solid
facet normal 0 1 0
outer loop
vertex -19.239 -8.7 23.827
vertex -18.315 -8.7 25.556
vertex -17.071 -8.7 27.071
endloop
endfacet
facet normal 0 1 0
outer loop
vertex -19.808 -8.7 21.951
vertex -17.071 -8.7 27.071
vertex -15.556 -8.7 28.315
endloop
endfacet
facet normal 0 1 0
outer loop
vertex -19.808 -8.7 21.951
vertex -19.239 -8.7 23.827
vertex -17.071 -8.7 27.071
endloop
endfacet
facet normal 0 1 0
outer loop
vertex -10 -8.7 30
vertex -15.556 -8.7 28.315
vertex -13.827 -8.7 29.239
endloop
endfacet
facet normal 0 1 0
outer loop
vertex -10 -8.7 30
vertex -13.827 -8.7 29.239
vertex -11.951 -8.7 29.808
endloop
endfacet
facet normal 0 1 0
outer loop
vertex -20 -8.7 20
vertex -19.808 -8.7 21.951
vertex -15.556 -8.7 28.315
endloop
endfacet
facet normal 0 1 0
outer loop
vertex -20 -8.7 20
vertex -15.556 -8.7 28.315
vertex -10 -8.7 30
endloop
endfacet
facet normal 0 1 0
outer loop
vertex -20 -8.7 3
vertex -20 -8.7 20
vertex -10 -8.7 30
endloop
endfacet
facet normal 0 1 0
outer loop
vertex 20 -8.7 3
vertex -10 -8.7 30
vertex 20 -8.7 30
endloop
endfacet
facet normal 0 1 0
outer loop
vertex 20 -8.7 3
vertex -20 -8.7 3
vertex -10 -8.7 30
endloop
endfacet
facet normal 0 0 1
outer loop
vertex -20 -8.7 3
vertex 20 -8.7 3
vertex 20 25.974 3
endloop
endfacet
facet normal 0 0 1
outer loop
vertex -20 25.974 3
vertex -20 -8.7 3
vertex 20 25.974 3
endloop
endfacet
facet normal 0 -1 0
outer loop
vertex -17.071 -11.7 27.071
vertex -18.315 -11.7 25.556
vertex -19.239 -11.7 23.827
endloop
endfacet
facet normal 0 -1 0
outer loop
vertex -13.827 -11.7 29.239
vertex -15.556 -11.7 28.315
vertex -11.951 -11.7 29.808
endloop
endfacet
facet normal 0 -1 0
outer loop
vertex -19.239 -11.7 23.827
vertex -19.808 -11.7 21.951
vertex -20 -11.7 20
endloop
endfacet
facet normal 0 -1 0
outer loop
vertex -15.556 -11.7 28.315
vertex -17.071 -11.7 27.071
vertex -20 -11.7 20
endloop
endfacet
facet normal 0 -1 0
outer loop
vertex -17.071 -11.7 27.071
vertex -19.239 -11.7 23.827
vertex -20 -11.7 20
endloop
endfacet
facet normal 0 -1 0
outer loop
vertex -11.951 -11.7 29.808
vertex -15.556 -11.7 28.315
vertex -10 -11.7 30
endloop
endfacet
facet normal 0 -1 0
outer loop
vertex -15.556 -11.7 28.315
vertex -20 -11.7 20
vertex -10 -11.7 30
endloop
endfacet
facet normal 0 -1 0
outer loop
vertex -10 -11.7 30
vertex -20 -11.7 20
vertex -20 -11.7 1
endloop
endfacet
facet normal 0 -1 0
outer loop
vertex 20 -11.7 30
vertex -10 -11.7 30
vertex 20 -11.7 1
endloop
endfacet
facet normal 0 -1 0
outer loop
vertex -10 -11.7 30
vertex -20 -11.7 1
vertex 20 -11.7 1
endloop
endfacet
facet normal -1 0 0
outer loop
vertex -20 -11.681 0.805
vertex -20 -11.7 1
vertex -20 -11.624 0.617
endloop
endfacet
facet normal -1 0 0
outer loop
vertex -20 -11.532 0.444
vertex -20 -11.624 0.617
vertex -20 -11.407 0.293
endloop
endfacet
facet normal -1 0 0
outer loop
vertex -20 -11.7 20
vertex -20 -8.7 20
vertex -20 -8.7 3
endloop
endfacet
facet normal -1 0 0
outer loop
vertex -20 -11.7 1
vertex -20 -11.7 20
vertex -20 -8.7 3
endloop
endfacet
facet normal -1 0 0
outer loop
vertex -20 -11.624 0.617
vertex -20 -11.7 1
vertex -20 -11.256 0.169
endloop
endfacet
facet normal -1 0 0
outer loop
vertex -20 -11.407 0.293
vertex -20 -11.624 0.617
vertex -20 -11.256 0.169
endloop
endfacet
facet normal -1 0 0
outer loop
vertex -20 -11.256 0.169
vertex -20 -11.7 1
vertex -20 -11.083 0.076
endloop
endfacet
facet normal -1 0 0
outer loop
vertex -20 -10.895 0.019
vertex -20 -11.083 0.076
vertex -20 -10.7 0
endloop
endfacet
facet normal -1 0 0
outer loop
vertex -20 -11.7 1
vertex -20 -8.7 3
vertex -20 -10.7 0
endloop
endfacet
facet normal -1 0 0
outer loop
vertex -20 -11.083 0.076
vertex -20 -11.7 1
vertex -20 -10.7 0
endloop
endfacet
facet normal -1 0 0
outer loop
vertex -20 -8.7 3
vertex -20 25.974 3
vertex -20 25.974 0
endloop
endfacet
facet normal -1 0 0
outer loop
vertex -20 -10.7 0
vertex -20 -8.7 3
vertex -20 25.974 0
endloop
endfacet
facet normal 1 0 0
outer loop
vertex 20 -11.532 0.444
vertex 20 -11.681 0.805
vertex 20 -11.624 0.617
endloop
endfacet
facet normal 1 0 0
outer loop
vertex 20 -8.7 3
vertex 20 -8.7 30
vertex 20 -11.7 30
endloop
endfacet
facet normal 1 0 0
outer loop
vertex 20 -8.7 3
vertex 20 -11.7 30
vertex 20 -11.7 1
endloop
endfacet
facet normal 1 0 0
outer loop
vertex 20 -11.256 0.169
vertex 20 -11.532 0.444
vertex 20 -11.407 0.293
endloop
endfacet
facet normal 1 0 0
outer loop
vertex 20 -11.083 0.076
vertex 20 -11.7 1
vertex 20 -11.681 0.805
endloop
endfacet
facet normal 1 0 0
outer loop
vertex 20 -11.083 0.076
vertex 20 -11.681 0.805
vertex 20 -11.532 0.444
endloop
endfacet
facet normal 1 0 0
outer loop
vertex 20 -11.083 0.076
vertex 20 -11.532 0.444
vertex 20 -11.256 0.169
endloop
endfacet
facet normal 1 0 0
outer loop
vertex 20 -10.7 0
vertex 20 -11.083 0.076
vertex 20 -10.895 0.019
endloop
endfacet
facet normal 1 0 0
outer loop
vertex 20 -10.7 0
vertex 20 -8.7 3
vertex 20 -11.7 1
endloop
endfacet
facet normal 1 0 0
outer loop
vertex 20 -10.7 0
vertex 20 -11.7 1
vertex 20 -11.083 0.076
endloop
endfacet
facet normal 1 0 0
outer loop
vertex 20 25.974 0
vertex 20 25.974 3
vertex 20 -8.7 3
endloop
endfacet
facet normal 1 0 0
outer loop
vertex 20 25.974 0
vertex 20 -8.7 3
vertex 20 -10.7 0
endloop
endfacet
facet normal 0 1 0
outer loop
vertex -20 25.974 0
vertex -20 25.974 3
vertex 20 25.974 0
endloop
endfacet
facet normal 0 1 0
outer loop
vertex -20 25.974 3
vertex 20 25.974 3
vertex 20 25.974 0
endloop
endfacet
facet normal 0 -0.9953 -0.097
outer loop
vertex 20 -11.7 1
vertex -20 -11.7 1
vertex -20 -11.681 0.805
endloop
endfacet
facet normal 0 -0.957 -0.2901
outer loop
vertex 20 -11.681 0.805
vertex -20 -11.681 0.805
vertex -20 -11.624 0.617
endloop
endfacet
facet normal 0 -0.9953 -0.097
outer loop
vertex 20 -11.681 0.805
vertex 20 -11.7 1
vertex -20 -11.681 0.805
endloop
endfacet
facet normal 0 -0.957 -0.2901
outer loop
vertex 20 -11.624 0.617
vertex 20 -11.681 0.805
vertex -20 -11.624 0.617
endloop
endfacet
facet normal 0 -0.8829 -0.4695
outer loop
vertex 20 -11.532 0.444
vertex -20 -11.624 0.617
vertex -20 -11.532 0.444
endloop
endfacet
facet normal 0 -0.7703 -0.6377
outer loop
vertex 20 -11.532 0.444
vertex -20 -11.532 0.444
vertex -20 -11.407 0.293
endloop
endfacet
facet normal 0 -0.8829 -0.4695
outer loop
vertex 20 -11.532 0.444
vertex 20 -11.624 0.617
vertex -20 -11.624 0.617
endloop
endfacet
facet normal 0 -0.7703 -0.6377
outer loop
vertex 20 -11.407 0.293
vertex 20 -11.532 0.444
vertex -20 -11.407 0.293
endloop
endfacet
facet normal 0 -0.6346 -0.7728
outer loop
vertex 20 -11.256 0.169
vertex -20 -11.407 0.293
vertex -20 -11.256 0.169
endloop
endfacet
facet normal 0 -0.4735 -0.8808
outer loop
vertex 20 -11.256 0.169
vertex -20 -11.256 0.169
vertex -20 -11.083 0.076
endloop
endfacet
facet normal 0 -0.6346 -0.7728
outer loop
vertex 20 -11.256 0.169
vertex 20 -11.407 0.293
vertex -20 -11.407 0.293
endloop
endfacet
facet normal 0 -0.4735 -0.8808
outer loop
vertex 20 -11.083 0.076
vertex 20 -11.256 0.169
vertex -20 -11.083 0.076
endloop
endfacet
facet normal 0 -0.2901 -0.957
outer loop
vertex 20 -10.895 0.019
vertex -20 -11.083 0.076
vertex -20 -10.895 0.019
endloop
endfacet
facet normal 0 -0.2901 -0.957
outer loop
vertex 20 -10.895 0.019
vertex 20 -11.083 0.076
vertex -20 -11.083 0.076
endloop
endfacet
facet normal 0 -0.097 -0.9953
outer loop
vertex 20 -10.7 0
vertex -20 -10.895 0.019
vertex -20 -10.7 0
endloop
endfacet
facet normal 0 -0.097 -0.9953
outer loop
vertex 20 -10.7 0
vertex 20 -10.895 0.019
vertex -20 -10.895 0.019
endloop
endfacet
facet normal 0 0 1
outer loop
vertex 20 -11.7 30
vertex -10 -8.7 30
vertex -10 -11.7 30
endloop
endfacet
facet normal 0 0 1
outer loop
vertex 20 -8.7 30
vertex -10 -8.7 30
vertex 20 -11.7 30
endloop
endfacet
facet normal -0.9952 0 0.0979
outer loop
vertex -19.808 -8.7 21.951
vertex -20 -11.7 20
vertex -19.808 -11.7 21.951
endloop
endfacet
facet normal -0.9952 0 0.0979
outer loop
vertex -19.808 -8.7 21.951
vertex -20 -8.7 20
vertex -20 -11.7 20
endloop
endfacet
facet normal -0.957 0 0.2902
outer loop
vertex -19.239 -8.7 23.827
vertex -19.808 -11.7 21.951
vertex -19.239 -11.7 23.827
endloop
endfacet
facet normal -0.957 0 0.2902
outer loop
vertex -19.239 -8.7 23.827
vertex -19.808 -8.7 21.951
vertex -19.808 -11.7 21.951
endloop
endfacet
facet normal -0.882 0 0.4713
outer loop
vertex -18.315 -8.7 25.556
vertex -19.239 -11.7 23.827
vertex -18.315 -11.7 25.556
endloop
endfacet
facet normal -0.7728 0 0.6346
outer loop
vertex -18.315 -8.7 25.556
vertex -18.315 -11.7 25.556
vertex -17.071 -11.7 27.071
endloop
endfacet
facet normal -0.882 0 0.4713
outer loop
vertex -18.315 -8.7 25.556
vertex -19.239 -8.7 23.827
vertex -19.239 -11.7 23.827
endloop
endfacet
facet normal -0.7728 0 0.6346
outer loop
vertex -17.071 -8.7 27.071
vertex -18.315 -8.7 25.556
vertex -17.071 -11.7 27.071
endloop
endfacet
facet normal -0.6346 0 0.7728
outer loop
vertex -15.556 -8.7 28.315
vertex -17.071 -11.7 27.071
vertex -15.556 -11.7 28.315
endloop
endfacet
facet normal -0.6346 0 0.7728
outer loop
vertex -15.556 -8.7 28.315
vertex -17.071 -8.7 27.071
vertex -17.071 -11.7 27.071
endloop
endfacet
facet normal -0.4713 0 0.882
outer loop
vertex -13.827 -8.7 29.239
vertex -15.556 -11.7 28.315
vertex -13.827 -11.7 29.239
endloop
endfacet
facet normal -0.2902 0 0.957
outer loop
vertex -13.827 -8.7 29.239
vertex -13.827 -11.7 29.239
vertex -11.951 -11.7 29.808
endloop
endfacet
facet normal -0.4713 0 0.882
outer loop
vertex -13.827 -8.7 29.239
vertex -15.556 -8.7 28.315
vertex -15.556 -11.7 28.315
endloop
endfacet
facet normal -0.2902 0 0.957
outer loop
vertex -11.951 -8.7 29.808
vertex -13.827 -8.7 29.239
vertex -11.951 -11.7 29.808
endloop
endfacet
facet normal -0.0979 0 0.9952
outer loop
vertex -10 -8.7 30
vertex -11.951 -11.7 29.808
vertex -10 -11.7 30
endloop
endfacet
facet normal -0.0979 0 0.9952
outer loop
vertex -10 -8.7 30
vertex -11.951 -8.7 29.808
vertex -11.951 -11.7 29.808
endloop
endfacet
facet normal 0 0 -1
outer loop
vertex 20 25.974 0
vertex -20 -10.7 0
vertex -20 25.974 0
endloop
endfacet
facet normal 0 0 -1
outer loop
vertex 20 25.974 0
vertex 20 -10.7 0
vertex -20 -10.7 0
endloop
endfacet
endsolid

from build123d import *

# Parameters (mm, degrees)
SKETCH_14_W     = 40
SKETCH_14_H     = 3
EXTRUDE_4_DEPTH = 30
FILLET_1_R      = 10
FILLET_3_R      = 1
SKETCH_15_W     = 3
SKETCH_15_H     = 34.674561042
EXTRUDE_1_DEPTH = 20


with BuildPart() as part:
    # 草图14 → 拉伸-薄壁4 (new body)
    with BuildSketch(Plane.XY):
        with Locations((0, -10.200267181)):
            Rectangle(SKETCH_14_W, SKETCH_14_H)
    extrude(amount=EXTRUDE_4_DEPTH)

    # 圆角1
    fillet_1_edges = [part.edges().sort_by_distance(p)[0] for p in [
        (-20, -10.200267181, 30),
    ]]
    fillet(fillet_1_edges, radius=FILLET_1_R)

    # 圆角3
    fillet_3_edges = [part.edges().sort_by_distance(p)[0] for p in [
        (0, -11.700267181, 0),
    ]]
    fillet(fillet_3_edges, radius=FILLET_3_R)

    # 草图15 → 凸台-拉伸1 (add, symmetric)
    with BuildSketch(Plane(origin=(0, 0, 0), x_dir=(0, 0, -1), z_dir=(1, 0, 0))):
        with Locations((-1.5, 8.63701334)):
            Rectangle(SKETCH_15_W, SKETCH_15_H)
    extrude(amount=EXTRUDE_1_DEPTH, both=True)


solid = part.part
